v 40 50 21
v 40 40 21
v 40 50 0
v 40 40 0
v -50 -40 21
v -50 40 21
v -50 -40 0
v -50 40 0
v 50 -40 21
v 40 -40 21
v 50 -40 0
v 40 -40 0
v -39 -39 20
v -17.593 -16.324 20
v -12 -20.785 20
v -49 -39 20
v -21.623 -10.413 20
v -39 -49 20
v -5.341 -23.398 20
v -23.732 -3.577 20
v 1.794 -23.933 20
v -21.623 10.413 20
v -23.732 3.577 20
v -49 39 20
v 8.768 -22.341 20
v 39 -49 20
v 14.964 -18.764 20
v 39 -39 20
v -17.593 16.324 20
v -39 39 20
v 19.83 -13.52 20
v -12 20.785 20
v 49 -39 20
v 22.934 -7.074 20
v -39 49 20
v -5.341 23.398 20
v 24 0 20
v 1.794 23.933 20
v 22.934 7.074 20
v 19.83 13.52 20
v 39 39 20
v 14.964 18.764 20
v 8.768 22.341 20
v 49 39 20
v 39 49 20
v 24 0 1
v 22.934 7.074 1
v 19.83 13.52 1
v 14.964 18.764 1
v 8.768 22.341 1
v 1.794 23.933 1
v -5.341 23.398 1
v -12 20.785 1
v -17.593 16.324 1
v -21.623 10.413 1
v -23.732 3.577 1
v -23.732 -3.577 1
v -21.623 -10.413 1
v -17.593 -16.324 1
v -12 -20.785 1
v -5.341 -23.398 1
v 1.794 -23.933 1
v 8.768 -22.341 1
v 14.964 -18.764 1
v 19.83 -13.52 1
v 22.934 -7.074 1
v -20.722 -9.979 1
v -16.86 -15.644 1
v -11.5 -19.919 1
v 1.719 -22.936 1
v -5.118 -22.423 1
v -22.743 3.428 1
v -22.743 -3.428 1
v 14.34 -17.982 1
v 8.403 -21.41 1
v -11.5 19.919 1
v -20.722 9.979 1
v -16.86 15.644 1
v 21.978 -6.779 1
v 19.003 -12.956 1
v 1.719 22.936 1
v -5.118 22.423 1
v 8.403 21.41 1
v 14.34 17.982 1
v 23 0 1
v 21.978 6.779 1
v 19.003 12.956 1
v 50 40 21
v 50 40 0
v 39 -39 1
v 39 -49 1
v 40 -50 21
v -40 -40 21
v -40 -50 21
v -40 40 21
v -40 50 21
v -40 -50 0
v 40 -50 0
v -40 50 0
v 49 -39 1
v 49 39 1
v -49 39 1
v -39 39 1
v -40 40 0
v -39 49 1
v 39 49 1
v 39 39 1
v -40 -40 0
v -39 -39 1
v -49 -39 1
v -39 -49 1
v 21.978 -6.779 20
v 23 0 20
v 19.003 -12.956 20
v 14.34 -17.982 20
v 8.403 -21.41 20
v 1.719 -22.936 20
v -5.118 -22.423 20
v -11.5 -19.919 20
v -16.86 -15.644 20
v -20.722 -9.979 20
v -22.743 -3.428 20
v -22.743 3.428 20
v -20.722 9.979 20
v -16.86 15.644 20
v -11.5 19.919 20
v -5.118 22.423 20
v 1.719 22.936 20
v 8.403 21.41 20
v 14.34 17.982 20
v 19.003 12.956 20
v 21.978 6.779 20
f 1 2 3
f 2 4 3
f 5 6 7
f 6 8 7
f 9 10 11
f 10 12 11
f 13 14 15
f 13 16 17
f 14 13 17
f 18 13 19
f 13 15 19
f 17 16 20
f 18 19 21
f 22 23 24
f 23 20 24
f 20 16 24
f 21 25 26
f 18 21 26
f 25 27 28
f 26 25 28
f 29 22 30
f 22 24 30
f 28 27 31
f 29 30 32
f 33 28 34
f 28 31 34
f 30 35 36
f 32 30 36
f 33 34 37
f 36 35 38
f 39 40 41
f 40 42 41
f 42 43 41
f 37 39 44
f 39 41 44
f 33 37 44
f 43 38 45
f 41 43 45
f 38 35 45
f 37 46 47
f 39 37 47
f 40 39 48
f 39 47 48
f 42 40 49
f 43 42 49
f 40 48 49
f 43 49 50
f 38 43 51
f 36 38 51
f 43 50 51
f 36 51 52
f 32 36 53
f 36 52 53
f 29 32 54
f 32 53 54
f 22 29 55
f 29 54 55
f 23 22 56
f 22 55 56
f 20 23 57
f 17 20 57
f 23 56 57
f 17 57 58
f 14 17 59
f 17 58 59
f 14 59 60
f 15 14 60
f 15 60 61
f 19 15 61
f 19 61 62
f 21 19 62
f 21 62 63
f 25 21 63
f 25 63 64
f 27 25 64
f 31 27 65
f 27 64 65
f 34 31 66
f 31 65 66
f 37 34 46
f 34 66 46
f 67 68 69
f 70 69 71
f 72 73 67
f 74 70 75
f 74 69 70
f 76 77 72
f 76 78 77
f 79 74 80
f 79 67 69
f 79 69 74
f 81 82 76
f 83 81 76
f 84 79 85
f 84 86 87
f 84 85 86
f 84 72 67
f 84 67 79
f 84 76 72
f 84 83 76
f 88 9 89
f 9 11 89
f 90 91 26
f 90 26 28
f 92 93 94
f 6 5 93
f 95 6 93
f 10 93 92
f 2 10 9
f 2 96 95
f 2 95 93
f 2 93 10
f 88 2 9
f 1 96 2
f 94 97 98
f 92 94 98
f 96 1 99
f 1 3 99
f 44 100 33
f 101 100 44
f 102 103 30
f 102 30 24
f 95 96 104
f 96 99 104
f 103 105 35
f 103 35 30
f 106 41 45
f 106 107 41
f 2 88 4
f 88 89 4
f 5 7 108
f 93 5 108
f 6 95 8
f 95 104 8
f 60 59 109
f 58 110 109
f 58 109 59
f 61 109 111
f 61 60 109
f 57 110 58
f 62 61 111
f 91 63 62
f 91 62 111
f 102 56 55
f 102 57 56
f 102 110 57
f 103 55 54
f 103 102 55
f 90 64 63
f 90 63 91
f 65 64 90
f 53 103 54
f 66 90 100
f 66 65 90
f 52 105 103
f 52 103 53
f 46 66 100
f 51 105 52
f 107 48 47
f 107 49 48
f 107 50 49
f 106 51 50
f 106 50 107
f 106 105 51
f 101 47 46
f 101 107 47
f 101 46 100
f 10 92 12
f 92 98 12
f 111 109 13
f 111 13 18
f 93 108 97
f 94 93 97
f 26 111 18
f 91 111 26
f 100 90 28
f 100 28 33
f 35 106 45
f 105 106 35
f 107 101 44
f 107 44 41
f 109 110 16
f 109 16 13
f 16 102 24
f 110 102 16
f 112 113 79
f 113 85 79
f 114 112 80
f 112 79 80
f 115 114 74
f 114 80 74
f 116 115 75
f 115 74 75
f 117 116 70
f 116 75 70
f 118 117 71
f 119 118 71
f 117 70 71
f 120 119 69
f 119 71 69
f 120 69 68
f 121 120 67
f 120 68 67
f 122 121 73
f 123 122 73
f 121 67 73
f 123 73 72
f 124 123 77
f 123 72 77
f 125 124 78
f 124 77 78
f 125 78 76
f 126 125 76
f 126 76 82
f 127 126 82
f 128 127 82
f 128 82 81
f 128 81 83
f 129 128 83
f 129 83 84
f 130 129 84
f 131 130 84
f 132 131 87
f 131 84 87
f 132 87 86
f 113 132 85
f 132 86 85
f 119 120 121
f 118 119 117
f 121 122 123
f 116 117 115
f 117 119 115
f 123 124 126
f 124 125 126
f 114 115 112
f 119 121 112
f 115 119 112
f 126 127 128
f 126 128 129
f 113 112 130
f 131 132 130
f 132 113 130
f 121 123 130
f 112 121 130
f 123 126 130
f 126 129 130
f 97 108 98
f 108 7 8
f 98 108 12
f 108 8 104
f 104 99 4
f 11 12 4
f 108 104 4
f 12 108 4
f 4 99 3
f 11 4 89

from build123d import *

# Parameters (mm, degrees)
F1_DEPTH = 20
F2_T     = -1
F3_R     = 24
F4_DEPTH = 19
F5_T     = -1
F7_DEPTH = 1


# Not quite as in the source:
# - a shell that OpenCascade refuses in one call is made with other operations: the cavity is built on its own and cut out


with BuildPart() as f1:
    # F0 (on Top) → F1 (new body)
    with BuildSketch(Plane.XY):
        Polygon((40, 50), (-40, 50), (-40, 40), (-50, 40), (-50, -40), (-40, -40), (-40, -50), (40, -50), (40, -40), (50, -40), (50, 40), (40, 40), align=None)
    extrude(amount=F1_DEPTH)

    # F2
    f2_openings = [f1.faces().sort_by_distance(p)[0] for p in [
        (0, 0, 20),
    ]]
    offset(amount=F2_T, openings=f2_openings, kind=Kind.INTERSECTION)

    # F3 (on face) → F4 (join)
    with BuildSketch(Plane.XY.offset(1)):
        Circle(F3_R)
    extrude(amount=F4_DEPTH)

    # F5: a shell. OpenCascade refuses it in one call, so the cavity is built on its own and cut out:
    # the body offset inwards by the wall thickness, plus a prism from it out through each open face.
    f5_core = offset(f1.part, amount=F5_T, kind=Kind.INTERSECTION, mode=Mode.PRIVATE)
    f5_exits = [f5_core.faces().sort_by_distance(p)[0] for p in [
        (0, 0, 19),
    ]]
    add(f5_core, mode=Mode.SUBTRACT)
    extrude(f5_exits, amount=-F5_T, mode=Mode.SUBTRACT)

    # F6 (on face) → F7 (join)
    with BuildSketch(Plane.XY.offset(20)):
        Polygon((-40, -50), (40, -50), (40, -40), (50, -40), (50, 40), (40, 40), (40, 50), (-40, 50), (-40, 40), (-50, 40), (-50, -40), (-40, -40), align=None)
    extrude(amount=F7_DEPTH)


solid = f1.part
